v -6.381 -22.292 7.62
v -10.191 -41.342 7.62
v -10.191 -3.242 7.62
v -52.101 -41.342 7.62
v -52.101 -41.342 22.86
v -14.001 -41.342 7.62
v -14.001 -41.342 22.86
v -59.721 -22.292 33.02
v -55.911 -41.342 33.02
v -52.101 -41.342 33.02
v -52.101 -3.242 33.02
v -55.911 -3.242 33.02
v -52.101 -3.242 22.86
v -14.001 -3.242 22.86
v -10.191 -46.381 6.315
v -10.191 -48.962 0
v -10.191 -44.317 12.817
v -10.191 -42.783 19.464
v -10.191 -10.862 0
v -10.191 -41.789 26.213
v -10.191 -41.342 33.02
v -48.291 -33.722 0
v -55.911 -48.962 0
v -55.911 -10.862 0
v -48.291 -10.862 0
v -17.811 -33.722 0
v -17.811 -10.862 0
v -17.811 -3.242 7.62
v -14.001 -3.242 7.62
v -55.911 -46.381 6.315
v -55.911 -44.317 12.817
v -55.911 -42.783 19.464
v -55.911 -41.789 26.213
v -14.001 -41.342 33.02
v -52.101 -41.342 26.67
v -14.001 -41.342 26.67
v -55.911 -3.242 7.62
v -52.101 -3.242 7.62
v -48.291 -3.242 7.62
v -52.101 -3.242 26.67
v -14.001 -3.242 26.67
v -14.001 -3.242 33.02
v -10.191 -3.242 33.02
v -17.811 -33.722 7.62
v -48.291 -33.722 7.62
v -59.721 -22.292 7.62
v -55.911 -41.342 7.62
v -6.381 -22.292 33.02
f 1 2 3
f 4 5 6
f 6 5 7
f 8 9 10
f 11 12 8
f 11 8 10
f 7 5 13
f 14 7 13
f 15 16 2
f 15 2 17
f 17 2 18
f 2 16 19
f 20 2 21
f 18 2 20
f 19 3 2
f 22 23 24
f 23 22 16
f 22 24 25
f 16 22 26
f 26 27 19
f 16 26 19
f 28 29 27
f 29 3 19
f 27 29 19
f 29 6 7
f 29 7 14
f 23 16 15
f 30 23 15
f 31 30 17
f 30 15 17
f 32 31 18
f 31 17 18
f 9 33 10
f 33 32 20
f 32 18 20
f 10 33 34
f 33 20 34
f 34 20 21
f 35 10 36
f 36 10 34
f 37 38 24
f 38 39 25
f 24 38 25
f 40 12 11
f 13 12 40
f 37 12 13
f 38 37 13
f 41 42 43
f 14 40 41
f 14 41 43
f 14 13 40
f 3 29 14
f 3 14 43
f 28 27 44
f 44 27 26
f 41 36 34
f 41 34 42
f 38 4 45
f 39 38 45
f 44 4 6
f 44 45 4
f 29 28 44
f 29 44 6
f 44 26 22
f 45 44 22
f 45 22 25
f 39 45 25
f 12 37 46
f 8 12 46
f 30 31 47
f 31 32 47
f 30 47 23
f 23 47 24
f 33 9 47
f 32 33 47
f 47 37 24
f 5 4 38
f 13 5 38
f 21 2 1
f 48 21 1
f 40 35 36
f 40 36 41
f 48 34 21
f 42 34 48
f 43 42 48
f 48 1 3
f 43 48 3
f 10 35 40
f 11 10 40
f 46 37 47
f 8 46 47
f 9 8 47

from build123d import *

# Parameters (mm, degrees)
F1_DEPTH  = 7.62
F3_DEPTH  = 50.8
F4_W      = 45.72
F4_H      = 38.1
F4_H_2    = 7.62
F5_DEPTH  = 7.62
F7_DEPTH  = 50.8
F8_W      = 3.81
F8_H      = 38.1
F9_DEPTH  = 25.4
F10_W     = 38.1
F10_H     = 3.81
F11_DEPTH = 38.1


with BuildPart() as f1:
    # F0 (on Top) → F1 (new body)
    with BuildSketch(Plane.XY):
        Polygon((-48.29051, -3.241779), (-55.91051, -3.241779), (-55.91051, -41.341779), (-10.19051, -41.341779), (-10.19051, -3.241779), (-17.81051, -3.241779), (-17.81051, -33.721779), (-48.29051, -33.721779), align=None)
    extrude(amount=F1_DEPTH)

    # F2 (on face) → F3 (cut)
    with BuildSketch(Plane.YZ.offset(-10.19051)):
        Polygon((-3.241779, 0), (-3.241779, 7.62), (-10.861779, 0), align=None)
    extrude(amount=-F3_DEPTH, mode=Mode.SUBTRACT)

    # F4 (on face) → F5 (join)
    with BuildSketch(Plane.XZ.offset(41.341779)):
        with Locations((-33.05051, 26.67)):
            Rectangle(F4_W, F4_H)
        with Locations((-33.05051, 3.81)):
            Rectangle(F4_W, F4_H_2)
    extrude(amount=F5_DEPTH)

    # F6 (on face) → F7 (cut)
    with BuildSketch(Plane.YZ.offset(-10.19051)):
        with BuildLine():
            Line((-48.961779, 45.72), (-48.961779, 0))
            ThreePointArc((-48.961779, 0), (-43.483086, 16.124917), (-41.341779, 33.02))
            Line((-41.341779, 33.02), (-41.341779, 45.72))
            Line((-41.341779, 45.72), (-48.961779, 45.72))
        make_face()
    extrude(amount=-F7_DEPTH, mode=Mode.SUBTRACT)

    # F8 (on face) → F9 (join)
    with BuildSketch(Plane.XY.offset(7.62)):
        Polygon((-10.19051, -3.241779), (-10.19051, -41.341779), (-6.38051, -22.291779), align=None)
        with Locations((-12.09551, -22.291779)):
            Rectangle(F8_W, F8_H)
        with Locations((-54.00551, -22.291779)):
            Rectangle(F8_W, F8_H)
        Polygon((-59.72051, -22.291779), (-55.91051, -41.341779), (-55.91051, -3.241779), align=None)
    extrude(amount=F9_DEPTH)

    # F10 (on face) → F11 (join)
    with BuildSketch(Plane.YZ.offset(-52.10051)):
        with Locations((-22.291779, 24.765)):
            Rectangle(F10_W, F10_H)
    extrude(amount=F11_DEPTH)


solid = f1.part
